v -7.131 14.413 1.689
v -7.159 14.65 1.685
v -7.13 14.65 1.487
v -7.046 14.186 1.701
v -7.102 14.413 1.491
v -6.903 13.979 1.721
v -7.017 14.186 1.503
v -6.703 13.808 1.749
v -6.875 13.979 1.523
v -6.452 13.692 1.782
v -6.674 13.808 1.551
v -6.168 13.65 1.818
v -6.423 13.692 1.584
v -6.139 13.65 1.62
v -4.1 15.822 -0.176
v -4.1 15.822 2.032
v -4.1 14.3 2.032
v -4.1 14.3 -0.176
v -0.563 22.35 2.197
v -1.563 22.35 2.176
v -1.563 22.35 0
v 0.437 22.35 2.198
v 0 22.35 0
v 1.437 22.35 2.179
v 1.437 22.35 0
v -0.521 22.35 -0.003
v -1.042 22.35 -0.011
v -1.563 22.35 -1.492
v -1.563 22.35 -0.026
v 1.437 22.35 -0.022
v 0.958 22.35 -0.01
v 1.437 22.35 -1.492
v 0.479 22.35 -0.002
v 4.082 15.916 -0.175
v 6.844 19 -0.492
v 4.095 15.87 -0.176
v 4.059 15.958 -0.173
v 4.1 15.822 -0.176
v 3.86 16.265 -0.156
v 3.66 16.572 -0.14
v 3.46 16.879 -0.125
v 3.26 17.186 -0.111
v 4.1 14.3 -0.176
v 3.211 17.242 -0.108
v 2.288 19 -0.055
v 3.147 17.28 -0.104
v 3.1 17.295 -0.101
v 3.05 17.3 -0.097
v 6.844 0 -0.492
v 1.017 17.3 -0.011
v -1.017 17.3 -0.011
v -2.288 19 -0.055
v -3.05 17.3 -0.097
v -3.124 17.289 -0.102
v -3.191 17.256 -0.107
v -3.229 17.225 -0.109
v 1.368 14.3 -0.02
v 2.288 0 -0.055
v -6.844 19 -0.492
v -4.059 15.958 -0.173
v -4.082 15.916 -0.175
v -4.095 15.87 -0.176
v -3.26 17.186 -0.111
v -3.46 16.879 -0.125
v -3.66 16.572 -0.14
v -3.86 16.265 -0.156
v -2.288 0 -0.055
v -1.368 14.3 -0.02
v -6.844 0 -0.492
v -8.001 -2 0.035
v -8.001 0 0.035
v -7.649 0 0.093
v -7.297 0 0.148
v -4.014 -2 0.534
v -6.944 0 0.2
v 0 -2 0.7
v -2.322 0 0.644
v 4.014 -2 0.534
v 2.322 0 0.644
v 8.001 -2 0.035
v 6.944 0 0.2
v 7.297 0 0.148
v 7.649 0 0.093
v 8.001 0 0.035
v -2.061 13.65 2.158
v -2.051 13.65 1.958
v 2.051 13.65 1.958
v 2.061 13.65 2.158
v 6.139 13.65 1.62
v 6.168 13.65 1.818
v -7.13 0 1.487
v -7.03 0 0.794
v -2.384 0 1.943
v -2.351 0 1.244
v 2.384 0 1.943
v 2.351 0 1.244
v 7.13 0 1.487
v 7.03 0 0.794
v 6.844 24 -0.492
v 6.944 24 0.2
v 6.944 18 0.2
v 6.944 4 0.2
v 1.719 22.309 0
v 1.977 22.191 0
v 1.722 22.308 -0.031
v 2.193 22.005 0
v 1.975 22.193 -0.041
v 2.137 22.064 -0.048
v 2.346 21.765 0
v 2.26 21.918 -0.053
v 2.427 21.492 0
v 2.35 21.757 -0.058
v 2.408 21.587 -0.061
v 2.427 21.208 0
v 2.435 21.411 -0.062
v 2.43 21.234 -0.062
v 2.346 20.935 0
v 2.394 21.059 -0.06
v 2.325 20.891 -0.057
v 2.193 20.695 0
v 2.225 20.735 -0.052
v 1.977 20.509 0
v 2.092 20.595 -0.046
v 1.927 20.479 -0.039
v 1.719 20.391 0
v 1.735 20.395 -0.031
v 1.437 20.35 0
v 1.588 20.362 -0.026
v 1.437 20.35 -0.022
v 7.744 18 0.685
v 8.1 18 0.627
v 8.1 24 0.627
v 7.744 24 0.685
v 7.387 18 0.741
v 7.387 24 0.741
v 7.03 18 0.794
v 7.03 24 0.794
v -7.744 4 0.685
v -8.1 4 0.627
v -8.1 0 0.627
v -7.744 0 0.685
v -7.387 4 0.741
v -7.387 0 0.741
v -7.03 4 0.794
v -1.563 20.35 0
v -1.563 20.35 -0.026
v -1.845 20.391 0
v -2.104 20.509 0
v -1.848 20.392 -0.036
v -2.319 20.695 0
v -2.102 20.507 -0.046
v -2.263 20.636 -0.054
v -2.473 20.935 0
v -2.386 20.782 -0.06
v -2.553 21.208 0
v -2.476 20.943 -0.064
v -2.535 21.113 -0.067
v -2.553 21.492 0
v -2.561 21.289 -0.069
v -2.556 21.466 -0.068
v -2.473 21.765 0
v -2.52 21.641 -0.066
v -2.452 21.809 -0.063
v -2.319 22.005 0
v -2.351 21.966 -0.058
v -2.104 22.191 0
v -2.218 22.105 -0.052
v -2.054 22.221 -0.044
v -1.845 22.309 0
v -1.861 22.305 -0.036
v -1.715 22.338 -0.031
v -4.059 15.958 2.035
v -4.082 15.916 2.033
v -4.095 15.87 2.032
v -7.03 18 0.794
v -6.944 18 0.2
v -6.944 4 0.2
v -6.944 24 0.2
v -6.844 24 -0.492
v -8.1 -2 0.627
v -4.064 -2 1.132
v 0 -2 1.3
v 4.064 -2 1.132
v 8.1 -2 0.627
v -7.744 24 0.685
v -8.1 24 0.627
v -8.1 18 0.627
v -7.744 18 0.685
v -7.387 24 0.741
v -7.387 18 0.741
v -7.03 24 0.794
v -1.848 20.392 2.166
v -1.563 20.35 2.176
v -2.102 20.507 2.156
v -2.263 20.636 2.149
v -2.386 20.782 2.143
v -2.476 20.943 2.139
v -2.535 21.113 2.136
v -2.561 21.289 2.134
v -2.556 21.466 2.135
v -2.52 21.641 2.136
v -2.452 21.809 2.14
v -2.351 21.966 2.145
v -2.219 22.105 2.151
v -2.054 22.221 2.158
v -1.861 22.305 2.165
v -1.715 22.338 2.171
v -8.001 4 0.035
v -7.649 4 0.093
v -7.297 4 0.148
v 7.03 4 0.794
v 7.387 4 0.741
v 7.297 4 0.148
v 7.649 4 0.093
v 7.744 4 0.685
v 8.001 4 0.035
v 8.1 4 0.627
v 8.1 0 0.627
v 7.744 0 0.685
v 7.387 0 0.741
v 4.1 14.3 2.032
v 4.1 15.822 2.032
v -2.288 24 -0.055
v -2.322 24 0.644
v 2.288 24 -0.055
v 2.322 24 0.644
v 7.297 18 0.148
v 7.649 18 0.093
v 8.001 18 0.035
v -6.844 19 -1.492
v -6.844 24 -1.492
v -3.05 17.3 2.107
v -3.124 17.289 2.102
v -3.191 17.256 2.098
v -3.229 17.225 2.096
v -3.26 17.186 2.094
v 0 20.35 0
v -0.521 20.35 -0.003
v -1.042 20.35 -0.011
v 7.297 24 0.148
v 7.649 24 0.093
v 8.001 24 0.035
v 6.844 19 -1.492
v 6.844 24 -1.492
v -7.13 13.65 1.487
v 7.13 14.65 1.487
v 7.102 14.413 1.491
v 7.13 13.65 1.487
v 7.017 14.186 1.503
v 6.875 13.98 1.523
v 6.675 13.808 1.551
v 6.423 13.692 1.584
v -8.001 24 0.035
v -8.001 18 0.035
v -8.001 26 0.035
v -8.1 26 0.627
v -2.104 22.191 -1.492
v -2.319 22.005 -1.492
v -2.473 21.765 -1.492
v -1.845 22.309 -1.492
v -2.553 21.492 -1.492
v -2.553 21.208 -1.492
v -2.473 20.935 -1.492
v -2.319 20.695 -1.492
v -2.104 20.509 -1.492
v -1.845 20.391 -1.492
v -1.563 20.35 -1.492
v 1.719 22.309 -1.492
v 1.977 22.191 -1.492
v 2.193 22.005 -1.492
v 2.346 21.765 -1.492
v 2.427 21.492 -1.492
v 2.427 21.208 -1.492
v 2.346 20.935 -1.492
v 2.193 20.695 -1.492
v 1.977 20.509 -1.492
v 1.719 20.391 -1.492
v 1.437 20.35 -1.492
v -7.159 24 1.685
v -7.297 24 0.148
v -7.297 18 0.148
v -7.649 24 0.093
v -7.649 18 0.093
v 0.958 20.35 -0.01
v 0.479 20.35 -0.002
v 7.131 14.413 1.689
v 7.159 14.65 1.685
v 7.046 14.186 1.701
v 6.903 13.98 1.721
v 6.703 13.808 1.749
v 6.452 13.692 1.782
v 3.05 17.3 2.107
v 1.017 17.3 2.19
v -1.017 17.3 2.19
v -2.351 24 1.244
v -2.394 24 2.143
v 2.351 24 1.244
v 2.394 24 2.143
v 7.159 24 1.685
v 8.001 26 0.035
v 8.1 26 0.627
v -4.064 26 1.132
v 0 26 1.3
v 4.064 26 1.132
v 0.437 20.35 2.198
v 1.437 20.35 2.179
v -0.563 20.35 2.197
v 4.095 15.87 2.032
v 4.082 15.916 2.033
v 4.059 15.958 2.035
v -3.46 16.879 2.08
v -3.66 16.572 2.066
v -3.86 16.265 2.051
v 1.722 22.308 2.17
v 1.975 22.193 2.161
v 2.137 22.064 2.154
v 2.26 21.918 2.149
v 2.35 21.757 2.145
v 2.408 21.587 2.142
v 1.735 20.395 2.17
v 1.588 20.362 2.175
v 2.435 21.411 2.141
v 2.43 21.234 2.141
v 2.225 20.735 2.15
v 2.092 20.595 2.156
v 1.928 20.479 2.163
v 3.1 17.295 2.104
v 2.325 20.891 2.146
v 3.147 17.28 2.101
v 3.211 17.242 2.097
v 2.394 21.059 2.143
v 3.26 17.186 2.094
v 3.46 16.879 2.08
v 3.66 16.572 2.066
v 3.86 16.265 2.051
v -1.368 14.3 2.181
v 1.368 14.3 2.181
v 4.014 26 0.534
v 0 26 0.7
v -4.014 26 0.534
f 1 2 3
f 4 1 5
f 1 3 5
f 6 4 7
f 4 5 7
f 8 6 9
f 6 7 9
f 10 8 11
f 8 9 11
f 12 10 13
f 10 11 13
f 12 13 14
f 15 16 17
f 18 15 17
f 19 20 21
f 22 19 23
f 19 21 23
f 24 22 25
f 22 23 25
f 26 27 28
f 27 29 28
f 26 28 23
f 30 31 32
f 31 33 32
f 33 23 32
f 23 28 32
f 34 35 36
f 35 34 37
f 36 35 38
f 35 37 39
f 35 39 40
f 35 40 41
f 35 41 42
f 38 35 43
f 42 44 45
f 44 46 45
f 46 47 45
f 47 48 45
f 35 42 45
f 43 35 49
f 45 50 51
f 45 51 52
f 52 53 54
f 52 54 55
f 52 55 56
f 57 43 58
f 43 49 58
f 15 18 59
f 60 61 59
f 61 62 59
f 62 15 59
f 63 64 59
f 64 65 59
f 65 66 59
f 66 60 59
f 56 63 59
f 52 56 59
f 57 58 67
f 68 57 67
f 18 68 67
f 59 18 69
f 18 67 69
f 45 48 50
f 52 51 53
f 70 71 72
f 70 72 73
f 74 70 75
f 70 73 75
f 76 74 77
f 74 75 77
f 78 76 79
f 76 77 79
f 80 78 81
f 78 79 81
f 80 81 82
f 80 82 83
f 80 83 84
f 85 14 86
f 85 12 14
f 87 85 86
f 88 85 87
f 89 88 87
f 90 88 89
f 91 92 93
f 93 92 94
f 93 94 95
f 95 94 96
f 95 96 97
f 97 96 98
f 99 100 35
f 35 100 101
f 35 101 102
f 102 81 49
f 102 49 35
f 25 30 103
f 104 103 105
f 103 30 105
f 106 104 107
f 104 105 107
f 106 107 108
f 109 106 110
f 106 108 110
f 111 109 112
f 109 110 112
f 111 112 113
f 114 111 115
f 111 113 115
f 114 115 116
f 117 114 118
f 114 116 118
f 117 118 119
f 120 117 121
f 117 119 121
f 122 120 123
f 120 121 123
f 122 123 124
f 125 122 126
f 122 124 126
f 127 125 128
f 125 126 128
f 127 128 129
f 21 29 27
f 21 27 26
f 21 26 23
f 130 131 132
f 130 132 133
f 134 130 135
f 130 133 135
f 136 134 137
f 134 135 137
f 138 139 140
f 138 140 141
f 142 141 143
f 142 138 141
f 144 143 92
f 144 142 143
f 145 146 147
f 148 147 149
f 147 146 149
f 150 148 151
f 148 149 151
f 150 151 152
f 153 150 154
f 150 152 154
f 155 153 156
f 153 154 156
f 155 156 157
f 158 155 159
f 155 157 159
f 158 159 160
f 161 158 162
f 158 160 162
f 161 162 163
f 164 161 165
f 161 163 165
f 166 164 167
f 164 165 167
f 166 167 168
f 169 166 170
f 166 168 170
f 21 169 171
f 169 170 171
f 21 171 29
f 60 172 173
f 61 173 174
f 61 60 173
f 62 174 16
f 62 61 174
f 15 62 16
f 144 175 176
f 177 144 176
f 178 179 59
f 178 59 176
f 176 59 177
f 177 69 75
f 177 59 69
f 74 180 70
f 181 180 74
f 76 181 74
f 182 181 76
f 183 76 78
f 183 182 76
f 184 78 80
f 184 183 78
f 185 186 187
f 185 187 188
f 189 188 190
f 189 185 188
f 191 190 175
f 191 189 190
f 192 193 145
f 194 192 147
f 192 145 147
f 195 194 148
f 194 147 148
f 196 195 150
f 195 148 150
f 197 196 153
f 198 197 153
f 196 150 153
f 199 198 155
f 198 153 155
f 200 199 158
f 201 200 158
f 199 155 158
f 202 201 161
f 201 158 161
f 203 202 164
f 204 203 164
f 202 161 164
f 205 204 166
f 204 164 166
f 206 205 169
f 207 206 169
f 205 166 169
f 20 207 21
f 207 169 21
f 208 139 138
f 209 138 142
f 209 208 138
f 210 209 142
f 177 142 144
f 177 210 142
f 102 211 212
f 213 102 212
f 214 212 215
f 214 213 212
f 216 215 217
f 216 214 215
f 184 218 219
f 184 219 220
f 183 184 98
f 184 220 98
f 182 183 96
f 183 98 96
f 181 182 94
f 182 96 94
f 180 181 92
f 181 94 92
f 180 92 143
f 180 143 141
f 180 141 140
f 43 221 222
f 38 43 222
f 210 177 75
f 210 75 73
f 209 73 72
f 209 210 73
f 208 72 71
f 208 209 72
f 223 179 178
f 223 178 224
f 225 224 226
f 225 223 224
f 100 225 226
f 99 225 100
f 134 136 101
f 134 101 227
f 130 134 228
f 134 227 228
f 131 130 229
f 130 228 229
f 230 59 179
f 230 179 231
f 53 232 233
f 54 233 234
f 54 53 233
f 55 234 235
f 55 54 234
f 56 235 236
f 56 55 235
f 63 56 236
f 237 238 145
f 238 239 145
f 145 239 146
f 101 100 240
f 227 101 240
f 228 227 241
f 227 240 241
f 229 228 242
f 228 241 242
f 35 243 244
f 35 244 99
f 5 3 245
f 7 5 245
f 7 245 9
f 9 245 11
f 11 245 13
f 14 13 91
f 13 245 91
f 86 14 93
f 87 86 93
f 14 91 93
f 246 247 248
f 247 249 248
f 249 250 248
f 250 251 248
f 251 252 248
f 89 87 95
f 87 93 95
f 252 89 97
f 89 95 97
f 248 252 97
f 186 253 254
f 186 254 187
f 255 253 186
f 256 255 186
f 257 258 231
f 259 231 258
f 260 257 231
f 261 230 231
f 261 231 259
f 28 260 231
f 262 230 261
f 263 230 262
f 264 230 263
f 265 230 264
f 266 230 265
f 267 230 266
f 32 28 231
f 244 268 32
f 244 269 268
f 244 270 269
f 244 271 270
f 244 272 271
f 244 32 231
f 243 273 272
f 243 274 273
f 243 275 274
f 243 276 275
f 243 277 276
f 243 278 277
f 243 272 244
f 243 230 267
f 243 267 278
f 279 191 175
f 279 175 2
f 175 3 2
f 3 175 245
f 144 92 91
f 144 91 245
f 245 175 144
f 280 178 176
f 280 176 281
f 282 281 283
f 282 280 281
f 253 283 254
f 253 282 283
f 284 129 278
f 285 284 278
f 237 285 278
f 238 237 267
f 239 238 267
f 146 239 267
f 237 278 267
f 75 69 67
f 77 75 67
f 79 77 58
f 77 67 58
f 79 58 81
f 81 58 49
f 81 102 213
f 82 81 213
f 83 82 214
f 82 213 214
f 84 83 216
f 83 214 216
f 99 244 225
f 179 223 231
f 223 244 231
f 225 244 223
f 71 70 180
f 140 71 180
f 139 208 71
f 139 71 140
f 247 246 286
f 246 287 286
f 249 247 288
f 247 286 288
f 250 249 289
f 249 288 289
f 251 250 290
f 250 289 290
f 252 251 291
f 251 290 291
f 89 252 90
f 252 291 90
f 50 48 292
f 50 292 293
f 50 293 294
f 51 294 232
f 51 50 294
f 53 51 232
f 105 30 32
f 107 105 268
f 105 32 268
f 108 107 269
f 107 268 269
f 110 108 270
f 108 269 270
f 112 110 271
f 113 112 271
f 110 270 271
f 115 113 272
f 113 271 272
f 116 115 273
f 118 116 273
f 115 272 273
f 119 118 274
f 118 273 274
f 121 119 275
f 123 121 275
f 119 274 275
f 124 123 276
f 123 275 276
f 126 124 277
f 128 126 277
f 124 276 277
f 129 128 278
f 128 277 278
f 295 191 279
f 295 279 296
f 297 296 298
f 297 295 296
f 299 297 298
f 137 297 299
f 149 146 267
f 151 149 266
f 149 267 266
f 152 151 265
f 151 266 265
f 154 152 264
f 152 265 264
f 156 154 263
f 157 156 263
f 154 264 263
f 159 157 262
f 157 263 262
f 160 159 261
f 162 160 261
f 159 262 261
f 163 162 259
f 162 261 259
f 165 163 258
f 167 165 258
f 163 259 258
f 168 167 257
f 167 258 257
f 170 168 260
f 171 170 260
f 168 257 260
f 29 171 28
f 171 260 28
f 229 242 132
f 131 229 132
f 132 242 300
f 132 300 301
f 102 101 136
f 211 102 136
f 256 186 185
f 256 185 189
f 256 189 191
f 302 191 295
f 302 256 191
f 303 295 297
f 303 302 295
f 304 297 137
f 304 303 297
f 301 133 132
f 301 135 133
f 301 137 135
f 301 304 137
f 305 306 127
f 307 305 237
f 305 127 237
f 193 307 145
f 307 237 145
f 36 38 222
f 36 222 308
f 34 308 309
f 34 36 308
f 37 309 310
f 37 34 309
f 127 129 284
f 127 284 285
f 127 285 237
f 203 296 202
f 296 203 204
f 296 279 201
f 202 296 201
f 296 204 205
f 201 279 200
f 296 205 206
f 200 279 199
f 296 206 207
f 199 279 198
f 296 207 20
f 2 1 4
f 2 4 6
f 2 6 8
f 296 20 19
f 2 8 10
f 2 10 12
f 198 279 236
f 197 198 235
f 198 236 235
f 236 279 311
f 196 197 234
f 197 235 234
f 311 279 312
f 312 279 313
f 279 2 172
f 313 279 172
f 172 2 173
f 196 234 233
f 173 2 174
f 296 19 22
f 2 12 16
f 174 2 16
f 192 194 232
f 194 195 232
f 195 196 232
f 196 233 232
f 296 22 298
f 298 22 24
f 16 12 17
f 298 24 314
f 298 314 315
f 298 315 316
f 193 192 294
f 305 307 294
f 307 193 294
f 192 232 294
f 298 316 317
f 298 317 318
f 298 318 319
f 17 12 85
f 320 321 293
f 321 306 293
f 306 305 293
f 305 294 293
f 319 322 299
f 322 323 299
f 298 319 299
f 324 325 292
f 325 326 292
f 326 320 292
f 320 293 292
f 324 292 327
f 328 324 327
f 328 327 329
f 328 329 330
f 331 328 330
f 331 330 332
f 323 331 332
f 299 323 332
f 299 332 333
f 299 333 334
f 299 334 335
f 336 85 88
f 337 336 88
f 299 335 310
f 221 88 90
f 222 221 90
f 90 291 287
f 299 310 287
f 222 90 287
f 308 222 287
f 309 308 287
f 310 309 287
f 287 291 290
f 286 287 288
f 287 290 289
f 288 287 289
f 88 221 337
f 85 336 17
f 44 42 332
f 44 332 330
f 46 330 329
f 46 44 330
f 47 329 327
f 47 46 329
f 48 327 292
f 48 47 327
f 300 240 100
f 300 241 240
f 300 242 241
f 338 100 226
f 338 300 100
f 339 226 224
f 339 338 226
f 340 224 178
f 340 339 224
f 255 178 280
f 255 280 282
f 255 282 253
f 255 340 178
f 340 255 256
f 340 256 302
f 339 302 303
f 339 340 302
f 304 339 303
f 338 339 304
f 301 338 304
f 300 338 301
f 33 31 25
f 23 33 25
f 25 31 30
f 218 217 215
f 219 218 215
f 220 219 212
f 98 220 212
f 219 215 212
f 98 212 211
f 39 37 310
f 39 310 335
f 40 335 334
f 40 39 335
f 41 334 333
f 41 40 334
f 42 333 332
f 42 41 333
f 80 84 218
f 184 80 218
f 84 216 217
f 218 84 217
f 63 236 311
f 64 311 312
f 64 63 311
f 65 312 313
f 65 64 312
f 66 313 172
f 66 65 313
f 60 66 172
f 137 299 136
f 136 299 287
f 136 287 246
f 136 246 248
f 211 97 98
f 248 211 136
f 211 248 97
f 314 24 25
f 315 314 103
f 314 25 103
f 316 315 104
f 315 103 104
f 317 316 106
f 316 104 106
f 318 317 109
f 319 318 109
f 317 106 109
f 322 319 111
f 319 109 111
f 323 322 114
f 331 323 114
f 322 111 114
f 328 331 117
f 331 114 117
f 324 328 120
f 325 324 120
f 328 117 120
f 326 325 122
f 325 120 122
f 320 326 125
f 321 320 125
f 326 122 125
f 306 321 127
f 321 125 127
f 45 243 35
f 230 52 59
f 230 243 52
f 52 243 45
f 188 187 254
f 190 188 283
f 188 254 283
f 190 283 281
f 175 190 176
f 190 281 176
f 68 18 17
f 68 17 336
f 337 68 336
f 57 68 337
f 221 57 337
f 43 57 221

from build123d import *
from build123d.topology import SkipClean

# Parameters (mm, degrees)
EXTRUDE_1_DEPTH          = 24
CUT_EXTRUDE_2_DEPTH      = 5
CUT_EXTRUDE_2_DEPTH_BACK = 5
EXTRUDE_2_DEPTH          = 24
EXTRUDE_START            = 2
EXTRUDE_3_DEPTH          = 2
EXTRUDE_4_DEPTH          = 2
CUT_EXTRUDE_3_DEPTH      = 13.65
FILLET_1_R               = 1
CUT_EXTRUDE_START        = -8
CUT_EXTRUDE_5_DEPTH      = 14
EXTRUDE_START_2          = -5
EXTRUDE_5_DEPTH          = 5
CUT_EXTRUDE_START_2      = -1.49247673
CUT_EXTRUDE_6_DEPTH      = 1.49247673


with BuildPart() as part:
    # Эскиз1 → Бобышка-Вытянуть1 (new body)
    with BuildSketch(Plane(origin=(0, 0, 0), x_dir=(1, 0, 0), z_dir=(0, 1, 0))):
        with BuildLine():
            Line((-6.84384702, 0.49247673), (-7.158835795, -1.684856977))
            ThreePointArc((-7.158835795, -1.684856977), (0, -2.2), (7.158835795, -1.684856977))
            Line((7.158835795, -1.684856977), (6.84384702, 0.49247673))
            ThreePointArc((6.84384702, 0.49247673), (0, 0), (-6.84384702, 0.49247673))
        make_face()
    extrude(amount=EXTRUDE_1_DEPTH)

    # Эскиз2 → Вырез-Вытянуть2 (cut, two sides: drawn at the far end of the back side and taken through both)
    with BuildSketch(Plane.XY.offset(-CUT_EXTRUDE_2_DEPTH_BACK)):
        with BuildLine():
            Line((3.05, 17.3), (-3.05, 17.3))
            ThreePointArc((-3.05, 17.3), (-3.169210201, 17.269768771), (-3.259607324, 17.186381965))
            Line((-3.259607324, 17.186381965), (-4.059452109, 15.958486928))
            ThreePointArc((-4.059452109, 15.958486928), (-4.089648868, 15.893165149), (-4.1, 15.821949749))
            Line((-4.1, 15.821949749), (-4.1, 14.788048333))
            Line((-4.1, 14.788048333), (-4.1, 14.3))
            Line((-4.1, 14.3), (4.1, 14.3))
            Line((4.1, 14.3), (4.1, 14.788048333))
            Line((4.1, 14.788048333), (4.1, 15.821949749))
            ThreePointArc((4.1, 15.821949749), (4.089648868, 15.893165149), (4.059452109, 15.958486928))
            Line((4.059452109, 15.958486928), (3.259607324, 17.186381965))
            ThreePointArc((3.259607324, 17.186381965), (3.169210201, 17.269768771), (3.05, 17.3))
        make_face()
        with BuildLine():
            Line((-0.063165968, 22.35), (1.436834032, 22.35))
            ThreePointArc((1.436834032, 22.35), (2.436834032, 21.35), (1.436834032, 20.35))
            Line((1.436834032, 20.35), (-1.563165968, 20.35))
            ThreePointArc((-1.563165968, 20.35), (-2.563165968, 21.35), (-1.563165968, 22.35))
            Line((-1.563165968, 22.35), (-0.063165968, 22.35))
        make_face()
    extrude(amount=CUT_EXTRUDE_2_DEPTH + CUT_EXTRUDE_2_DEPTH_BACK, mode=Mode.SUBTRACT)

    # Эскиз3 → Бобышка-Вытянуть2 (add)
    with BuildSketch(Plane(origin=(0, 24, 0), x_dir=(1, 0, 0), z_dir=(0, 1, 0))):
        with BuildLine():
            Line((-8.001110971, -0.035470346), (-8.100093787, -0.627249361))
            ThreePointArc((-8.100093787, -0.627249361), (-7.565495415, -0.713640135), (-7.029976751, -0.794129552))
            Line((-7.029976751, -0.794129552), (-6.944070721, -0.200311268))
            ThreePointArc((-6.944070721, -0.200311268), (-7.473045369, -0.120805428), (-8.001110971, -0.035470346))
        make_face()
        with BuildLine():
            Line((8.001110971, -0.035470346), (8.100093787, -0.627249361))
            ThreePointArc((8.100093787, -0.627249361), (7.565495415, -0.713640135), (7.029976751, -0.794129552))
            Line((7.029976751, -0.794129552), (6.944070721, -0.200311268))
            ThreePointArc((6.944070721, -0.200311268), (7.473045369, -0.120805428), (8.001110971, -0.035470346))
        make_face()
    extrude(amount=-EXTRUDE_2_DEPTH)

    # Эскиз4 → Бобышка-Вытянуть3 (add)
    with SkipClean():  # the faces are left unmerged after this step: merging them gives an invalid solid
        with BuildSketch(Plane(origin=(0, 24, 0), x_dir=(1, 0, 0), z_dir=(0, 1, 0)).offset(EXTRUDE_START)):
            with BuildLine():
                Line((-8.001110971, -0.035470346), (-8.100093787, -0.627249361))
                ThreePointArc((-8.100093787, -0.627249361), (0, -1.3), (8.100093787, -0.627249361))
                Line((8.100093787, -0.627249361), (8.001110971, -0.035470346))
                ThreePointArc((8.001110971, -0.035470346), (0, -0.7), (-8.001110971, -0.035470346))
            make_face()
        extrude(amount=-EXTRUDE_3_DEPTH)

    # Эскиз5 → Бобышка-Вытянуть4 (add)
    with SkipClean():  # the faces are left unmerged after this step: merging them gives an invalid solid
        with BuildSketch(Plane.XZ):
            with BuildLine():
                Line((8.001110971, 0.035470346), (8.100093787, 0.627249361))
                ThreePointArc((8.100093787, 0.627249361), (0, 1.3), (-8.100093787, 0.627249361))
                Line((-8.100093787, 0.627249361), (-8.001110971, 0.035470346))
                ThreePointArc((-8.001110971, 0.035470346), (0, 0.7), (8.001110971, 0.035470346))
            make_face()
        extrude(amount=EXTRUDE_4_DEPTH)

    # Эскиз6 → Вырез-Вытянуть3 (cut)
    with SkipClean():  # the faces are left unmerged after this step: merging them gives an invalid solid
        with BuildSketch(Plane.XZ):
            with BuildLine():
                Line((-7.158835795, 1.684856977), (-7.130200452, 1.486917549))
                ThreePointArc((-7.130200452, 1.486917549), (0, 2), (7.130200452, 1.486917549))
                Line((7.130200452, 1.486917549), (7.158835795, 1.684856977))
                ThreePointArc((7.158835795, 1.684856977), (0, 2.2), (-7.158835795, 1.684856977))
            make_face()
        extrude(amount=-CUT_EXTRUDE_3_DEPTH, mode=Mode.SUBTRACT)

    # Скругление1
    fillet_1_edges = [part.edges().sort_by_distance(p)[0] for p in [
        (7.144518124, 13.65, 1.585887263),
        (-7.144518124, 13.65, 1.585887263),
    ]]
    fillet(fillet_1_edges, radius=FILLET_1_R)

    # Эскиз8 → Вырез-Вытянуть5 (cut)
    with SkipClean():  # the faces are left unmerged after this step: merging them gives an invalid solid
        with BuildSketch(Plane(origin=(0, 26, 0), x_dir=(1, 0, 0), z_dir=(0, 1, 0)).offset(CUT_EXTRUDE_START)):
            with BuildLine():
                Line((8.100093787, -0.627249361), (8.001110971, -0.035470346))
                ThreePointArc((8.001110971, -0.035470346), (7.473045369, -0.120805428), (6.944070721, -0.200311268))
                Line((6.944070721, -0.200311268), (7.029976751, -0.794129552))
                ThreePointArc((7.029976751, -0.794129552), (7.565495415, -0.713640135), (8.100093787, -0.627249361))
            make_face()
            with BuildLine():
                Line((-8.001110971, -0.035470346), (-8.100093787, -0.627249361))
                ThreePointArc((-8.100093787, -0.627249361), (-7.565495415, -0.713640135), (-7.029976751, -0.794129552))
                Line((-7.029976751, -0.794129552), (-6.944070721, -0.200311268))
                ThreePointArc((-6.944070721, -0.200311268), (-7.473045369, -0.120805428), (-8.001110971, -0.035470346))
            make_face()
        extrude(amount=-CUT_EXTRUDE_5_DEPTH, mode=Mode.SUBTRACT)

    # Эскиз9 → Бобышка-Вытянуть5 (add)
    with SkipClean():  # the faces are left unmerged after this step: merging them gives an invalid solid
        with BuildSketch(Plane(origin=(0, 24, 0), x_dir=(1, 0, 0), z_dir=(0, 1, 0)).offset(EXTRUDE_START_2)):
            with BuildLine():
                Line((-6.84384702, 0.49247673), (-6.84384702, 1.49247673))
                Line((-6.84384702, 1.49247673), (6.84384702, 1.49247673))
                Line((6.84384702, 1.49247673), (6.84384702, 0.49247673))
                ThreePointArc((6.84384702, 0.49247673), (0, 0), (-6.84384702, 0.49247673))
            make_face()
        extrude(amount=EXTRUDE_5_DEPTH)

    # Эскиз10 → Вырез-Вытянуть6 (cut)
    with SkipClean():  # the faces are left unmerged after this step: merging them gives an invalid solid
        with BuildSketch(Plane.XY.offset(CUT_EXTRUDE_START_2)):
            with BuildLine():
                Line((1.436834032, 20.35), (-1.563165968, 20.35))
                ThreePointArc((-1.563165968, 20.35), (-2.563165968, 21.35), (-1.563165968, 22.35))
                Line((-1.563165968, 22.35), (1.436834032, 22.35))
                ThreePointArc((1.436834032, 22.35), (2.436834032, 21.35), (1.436834032, 20.35))
            make_face()
        extrude(amount=CUT_EXTRUDE_6_DEPTH, mode=Mode.SUBTRACT)


solid = part.part
